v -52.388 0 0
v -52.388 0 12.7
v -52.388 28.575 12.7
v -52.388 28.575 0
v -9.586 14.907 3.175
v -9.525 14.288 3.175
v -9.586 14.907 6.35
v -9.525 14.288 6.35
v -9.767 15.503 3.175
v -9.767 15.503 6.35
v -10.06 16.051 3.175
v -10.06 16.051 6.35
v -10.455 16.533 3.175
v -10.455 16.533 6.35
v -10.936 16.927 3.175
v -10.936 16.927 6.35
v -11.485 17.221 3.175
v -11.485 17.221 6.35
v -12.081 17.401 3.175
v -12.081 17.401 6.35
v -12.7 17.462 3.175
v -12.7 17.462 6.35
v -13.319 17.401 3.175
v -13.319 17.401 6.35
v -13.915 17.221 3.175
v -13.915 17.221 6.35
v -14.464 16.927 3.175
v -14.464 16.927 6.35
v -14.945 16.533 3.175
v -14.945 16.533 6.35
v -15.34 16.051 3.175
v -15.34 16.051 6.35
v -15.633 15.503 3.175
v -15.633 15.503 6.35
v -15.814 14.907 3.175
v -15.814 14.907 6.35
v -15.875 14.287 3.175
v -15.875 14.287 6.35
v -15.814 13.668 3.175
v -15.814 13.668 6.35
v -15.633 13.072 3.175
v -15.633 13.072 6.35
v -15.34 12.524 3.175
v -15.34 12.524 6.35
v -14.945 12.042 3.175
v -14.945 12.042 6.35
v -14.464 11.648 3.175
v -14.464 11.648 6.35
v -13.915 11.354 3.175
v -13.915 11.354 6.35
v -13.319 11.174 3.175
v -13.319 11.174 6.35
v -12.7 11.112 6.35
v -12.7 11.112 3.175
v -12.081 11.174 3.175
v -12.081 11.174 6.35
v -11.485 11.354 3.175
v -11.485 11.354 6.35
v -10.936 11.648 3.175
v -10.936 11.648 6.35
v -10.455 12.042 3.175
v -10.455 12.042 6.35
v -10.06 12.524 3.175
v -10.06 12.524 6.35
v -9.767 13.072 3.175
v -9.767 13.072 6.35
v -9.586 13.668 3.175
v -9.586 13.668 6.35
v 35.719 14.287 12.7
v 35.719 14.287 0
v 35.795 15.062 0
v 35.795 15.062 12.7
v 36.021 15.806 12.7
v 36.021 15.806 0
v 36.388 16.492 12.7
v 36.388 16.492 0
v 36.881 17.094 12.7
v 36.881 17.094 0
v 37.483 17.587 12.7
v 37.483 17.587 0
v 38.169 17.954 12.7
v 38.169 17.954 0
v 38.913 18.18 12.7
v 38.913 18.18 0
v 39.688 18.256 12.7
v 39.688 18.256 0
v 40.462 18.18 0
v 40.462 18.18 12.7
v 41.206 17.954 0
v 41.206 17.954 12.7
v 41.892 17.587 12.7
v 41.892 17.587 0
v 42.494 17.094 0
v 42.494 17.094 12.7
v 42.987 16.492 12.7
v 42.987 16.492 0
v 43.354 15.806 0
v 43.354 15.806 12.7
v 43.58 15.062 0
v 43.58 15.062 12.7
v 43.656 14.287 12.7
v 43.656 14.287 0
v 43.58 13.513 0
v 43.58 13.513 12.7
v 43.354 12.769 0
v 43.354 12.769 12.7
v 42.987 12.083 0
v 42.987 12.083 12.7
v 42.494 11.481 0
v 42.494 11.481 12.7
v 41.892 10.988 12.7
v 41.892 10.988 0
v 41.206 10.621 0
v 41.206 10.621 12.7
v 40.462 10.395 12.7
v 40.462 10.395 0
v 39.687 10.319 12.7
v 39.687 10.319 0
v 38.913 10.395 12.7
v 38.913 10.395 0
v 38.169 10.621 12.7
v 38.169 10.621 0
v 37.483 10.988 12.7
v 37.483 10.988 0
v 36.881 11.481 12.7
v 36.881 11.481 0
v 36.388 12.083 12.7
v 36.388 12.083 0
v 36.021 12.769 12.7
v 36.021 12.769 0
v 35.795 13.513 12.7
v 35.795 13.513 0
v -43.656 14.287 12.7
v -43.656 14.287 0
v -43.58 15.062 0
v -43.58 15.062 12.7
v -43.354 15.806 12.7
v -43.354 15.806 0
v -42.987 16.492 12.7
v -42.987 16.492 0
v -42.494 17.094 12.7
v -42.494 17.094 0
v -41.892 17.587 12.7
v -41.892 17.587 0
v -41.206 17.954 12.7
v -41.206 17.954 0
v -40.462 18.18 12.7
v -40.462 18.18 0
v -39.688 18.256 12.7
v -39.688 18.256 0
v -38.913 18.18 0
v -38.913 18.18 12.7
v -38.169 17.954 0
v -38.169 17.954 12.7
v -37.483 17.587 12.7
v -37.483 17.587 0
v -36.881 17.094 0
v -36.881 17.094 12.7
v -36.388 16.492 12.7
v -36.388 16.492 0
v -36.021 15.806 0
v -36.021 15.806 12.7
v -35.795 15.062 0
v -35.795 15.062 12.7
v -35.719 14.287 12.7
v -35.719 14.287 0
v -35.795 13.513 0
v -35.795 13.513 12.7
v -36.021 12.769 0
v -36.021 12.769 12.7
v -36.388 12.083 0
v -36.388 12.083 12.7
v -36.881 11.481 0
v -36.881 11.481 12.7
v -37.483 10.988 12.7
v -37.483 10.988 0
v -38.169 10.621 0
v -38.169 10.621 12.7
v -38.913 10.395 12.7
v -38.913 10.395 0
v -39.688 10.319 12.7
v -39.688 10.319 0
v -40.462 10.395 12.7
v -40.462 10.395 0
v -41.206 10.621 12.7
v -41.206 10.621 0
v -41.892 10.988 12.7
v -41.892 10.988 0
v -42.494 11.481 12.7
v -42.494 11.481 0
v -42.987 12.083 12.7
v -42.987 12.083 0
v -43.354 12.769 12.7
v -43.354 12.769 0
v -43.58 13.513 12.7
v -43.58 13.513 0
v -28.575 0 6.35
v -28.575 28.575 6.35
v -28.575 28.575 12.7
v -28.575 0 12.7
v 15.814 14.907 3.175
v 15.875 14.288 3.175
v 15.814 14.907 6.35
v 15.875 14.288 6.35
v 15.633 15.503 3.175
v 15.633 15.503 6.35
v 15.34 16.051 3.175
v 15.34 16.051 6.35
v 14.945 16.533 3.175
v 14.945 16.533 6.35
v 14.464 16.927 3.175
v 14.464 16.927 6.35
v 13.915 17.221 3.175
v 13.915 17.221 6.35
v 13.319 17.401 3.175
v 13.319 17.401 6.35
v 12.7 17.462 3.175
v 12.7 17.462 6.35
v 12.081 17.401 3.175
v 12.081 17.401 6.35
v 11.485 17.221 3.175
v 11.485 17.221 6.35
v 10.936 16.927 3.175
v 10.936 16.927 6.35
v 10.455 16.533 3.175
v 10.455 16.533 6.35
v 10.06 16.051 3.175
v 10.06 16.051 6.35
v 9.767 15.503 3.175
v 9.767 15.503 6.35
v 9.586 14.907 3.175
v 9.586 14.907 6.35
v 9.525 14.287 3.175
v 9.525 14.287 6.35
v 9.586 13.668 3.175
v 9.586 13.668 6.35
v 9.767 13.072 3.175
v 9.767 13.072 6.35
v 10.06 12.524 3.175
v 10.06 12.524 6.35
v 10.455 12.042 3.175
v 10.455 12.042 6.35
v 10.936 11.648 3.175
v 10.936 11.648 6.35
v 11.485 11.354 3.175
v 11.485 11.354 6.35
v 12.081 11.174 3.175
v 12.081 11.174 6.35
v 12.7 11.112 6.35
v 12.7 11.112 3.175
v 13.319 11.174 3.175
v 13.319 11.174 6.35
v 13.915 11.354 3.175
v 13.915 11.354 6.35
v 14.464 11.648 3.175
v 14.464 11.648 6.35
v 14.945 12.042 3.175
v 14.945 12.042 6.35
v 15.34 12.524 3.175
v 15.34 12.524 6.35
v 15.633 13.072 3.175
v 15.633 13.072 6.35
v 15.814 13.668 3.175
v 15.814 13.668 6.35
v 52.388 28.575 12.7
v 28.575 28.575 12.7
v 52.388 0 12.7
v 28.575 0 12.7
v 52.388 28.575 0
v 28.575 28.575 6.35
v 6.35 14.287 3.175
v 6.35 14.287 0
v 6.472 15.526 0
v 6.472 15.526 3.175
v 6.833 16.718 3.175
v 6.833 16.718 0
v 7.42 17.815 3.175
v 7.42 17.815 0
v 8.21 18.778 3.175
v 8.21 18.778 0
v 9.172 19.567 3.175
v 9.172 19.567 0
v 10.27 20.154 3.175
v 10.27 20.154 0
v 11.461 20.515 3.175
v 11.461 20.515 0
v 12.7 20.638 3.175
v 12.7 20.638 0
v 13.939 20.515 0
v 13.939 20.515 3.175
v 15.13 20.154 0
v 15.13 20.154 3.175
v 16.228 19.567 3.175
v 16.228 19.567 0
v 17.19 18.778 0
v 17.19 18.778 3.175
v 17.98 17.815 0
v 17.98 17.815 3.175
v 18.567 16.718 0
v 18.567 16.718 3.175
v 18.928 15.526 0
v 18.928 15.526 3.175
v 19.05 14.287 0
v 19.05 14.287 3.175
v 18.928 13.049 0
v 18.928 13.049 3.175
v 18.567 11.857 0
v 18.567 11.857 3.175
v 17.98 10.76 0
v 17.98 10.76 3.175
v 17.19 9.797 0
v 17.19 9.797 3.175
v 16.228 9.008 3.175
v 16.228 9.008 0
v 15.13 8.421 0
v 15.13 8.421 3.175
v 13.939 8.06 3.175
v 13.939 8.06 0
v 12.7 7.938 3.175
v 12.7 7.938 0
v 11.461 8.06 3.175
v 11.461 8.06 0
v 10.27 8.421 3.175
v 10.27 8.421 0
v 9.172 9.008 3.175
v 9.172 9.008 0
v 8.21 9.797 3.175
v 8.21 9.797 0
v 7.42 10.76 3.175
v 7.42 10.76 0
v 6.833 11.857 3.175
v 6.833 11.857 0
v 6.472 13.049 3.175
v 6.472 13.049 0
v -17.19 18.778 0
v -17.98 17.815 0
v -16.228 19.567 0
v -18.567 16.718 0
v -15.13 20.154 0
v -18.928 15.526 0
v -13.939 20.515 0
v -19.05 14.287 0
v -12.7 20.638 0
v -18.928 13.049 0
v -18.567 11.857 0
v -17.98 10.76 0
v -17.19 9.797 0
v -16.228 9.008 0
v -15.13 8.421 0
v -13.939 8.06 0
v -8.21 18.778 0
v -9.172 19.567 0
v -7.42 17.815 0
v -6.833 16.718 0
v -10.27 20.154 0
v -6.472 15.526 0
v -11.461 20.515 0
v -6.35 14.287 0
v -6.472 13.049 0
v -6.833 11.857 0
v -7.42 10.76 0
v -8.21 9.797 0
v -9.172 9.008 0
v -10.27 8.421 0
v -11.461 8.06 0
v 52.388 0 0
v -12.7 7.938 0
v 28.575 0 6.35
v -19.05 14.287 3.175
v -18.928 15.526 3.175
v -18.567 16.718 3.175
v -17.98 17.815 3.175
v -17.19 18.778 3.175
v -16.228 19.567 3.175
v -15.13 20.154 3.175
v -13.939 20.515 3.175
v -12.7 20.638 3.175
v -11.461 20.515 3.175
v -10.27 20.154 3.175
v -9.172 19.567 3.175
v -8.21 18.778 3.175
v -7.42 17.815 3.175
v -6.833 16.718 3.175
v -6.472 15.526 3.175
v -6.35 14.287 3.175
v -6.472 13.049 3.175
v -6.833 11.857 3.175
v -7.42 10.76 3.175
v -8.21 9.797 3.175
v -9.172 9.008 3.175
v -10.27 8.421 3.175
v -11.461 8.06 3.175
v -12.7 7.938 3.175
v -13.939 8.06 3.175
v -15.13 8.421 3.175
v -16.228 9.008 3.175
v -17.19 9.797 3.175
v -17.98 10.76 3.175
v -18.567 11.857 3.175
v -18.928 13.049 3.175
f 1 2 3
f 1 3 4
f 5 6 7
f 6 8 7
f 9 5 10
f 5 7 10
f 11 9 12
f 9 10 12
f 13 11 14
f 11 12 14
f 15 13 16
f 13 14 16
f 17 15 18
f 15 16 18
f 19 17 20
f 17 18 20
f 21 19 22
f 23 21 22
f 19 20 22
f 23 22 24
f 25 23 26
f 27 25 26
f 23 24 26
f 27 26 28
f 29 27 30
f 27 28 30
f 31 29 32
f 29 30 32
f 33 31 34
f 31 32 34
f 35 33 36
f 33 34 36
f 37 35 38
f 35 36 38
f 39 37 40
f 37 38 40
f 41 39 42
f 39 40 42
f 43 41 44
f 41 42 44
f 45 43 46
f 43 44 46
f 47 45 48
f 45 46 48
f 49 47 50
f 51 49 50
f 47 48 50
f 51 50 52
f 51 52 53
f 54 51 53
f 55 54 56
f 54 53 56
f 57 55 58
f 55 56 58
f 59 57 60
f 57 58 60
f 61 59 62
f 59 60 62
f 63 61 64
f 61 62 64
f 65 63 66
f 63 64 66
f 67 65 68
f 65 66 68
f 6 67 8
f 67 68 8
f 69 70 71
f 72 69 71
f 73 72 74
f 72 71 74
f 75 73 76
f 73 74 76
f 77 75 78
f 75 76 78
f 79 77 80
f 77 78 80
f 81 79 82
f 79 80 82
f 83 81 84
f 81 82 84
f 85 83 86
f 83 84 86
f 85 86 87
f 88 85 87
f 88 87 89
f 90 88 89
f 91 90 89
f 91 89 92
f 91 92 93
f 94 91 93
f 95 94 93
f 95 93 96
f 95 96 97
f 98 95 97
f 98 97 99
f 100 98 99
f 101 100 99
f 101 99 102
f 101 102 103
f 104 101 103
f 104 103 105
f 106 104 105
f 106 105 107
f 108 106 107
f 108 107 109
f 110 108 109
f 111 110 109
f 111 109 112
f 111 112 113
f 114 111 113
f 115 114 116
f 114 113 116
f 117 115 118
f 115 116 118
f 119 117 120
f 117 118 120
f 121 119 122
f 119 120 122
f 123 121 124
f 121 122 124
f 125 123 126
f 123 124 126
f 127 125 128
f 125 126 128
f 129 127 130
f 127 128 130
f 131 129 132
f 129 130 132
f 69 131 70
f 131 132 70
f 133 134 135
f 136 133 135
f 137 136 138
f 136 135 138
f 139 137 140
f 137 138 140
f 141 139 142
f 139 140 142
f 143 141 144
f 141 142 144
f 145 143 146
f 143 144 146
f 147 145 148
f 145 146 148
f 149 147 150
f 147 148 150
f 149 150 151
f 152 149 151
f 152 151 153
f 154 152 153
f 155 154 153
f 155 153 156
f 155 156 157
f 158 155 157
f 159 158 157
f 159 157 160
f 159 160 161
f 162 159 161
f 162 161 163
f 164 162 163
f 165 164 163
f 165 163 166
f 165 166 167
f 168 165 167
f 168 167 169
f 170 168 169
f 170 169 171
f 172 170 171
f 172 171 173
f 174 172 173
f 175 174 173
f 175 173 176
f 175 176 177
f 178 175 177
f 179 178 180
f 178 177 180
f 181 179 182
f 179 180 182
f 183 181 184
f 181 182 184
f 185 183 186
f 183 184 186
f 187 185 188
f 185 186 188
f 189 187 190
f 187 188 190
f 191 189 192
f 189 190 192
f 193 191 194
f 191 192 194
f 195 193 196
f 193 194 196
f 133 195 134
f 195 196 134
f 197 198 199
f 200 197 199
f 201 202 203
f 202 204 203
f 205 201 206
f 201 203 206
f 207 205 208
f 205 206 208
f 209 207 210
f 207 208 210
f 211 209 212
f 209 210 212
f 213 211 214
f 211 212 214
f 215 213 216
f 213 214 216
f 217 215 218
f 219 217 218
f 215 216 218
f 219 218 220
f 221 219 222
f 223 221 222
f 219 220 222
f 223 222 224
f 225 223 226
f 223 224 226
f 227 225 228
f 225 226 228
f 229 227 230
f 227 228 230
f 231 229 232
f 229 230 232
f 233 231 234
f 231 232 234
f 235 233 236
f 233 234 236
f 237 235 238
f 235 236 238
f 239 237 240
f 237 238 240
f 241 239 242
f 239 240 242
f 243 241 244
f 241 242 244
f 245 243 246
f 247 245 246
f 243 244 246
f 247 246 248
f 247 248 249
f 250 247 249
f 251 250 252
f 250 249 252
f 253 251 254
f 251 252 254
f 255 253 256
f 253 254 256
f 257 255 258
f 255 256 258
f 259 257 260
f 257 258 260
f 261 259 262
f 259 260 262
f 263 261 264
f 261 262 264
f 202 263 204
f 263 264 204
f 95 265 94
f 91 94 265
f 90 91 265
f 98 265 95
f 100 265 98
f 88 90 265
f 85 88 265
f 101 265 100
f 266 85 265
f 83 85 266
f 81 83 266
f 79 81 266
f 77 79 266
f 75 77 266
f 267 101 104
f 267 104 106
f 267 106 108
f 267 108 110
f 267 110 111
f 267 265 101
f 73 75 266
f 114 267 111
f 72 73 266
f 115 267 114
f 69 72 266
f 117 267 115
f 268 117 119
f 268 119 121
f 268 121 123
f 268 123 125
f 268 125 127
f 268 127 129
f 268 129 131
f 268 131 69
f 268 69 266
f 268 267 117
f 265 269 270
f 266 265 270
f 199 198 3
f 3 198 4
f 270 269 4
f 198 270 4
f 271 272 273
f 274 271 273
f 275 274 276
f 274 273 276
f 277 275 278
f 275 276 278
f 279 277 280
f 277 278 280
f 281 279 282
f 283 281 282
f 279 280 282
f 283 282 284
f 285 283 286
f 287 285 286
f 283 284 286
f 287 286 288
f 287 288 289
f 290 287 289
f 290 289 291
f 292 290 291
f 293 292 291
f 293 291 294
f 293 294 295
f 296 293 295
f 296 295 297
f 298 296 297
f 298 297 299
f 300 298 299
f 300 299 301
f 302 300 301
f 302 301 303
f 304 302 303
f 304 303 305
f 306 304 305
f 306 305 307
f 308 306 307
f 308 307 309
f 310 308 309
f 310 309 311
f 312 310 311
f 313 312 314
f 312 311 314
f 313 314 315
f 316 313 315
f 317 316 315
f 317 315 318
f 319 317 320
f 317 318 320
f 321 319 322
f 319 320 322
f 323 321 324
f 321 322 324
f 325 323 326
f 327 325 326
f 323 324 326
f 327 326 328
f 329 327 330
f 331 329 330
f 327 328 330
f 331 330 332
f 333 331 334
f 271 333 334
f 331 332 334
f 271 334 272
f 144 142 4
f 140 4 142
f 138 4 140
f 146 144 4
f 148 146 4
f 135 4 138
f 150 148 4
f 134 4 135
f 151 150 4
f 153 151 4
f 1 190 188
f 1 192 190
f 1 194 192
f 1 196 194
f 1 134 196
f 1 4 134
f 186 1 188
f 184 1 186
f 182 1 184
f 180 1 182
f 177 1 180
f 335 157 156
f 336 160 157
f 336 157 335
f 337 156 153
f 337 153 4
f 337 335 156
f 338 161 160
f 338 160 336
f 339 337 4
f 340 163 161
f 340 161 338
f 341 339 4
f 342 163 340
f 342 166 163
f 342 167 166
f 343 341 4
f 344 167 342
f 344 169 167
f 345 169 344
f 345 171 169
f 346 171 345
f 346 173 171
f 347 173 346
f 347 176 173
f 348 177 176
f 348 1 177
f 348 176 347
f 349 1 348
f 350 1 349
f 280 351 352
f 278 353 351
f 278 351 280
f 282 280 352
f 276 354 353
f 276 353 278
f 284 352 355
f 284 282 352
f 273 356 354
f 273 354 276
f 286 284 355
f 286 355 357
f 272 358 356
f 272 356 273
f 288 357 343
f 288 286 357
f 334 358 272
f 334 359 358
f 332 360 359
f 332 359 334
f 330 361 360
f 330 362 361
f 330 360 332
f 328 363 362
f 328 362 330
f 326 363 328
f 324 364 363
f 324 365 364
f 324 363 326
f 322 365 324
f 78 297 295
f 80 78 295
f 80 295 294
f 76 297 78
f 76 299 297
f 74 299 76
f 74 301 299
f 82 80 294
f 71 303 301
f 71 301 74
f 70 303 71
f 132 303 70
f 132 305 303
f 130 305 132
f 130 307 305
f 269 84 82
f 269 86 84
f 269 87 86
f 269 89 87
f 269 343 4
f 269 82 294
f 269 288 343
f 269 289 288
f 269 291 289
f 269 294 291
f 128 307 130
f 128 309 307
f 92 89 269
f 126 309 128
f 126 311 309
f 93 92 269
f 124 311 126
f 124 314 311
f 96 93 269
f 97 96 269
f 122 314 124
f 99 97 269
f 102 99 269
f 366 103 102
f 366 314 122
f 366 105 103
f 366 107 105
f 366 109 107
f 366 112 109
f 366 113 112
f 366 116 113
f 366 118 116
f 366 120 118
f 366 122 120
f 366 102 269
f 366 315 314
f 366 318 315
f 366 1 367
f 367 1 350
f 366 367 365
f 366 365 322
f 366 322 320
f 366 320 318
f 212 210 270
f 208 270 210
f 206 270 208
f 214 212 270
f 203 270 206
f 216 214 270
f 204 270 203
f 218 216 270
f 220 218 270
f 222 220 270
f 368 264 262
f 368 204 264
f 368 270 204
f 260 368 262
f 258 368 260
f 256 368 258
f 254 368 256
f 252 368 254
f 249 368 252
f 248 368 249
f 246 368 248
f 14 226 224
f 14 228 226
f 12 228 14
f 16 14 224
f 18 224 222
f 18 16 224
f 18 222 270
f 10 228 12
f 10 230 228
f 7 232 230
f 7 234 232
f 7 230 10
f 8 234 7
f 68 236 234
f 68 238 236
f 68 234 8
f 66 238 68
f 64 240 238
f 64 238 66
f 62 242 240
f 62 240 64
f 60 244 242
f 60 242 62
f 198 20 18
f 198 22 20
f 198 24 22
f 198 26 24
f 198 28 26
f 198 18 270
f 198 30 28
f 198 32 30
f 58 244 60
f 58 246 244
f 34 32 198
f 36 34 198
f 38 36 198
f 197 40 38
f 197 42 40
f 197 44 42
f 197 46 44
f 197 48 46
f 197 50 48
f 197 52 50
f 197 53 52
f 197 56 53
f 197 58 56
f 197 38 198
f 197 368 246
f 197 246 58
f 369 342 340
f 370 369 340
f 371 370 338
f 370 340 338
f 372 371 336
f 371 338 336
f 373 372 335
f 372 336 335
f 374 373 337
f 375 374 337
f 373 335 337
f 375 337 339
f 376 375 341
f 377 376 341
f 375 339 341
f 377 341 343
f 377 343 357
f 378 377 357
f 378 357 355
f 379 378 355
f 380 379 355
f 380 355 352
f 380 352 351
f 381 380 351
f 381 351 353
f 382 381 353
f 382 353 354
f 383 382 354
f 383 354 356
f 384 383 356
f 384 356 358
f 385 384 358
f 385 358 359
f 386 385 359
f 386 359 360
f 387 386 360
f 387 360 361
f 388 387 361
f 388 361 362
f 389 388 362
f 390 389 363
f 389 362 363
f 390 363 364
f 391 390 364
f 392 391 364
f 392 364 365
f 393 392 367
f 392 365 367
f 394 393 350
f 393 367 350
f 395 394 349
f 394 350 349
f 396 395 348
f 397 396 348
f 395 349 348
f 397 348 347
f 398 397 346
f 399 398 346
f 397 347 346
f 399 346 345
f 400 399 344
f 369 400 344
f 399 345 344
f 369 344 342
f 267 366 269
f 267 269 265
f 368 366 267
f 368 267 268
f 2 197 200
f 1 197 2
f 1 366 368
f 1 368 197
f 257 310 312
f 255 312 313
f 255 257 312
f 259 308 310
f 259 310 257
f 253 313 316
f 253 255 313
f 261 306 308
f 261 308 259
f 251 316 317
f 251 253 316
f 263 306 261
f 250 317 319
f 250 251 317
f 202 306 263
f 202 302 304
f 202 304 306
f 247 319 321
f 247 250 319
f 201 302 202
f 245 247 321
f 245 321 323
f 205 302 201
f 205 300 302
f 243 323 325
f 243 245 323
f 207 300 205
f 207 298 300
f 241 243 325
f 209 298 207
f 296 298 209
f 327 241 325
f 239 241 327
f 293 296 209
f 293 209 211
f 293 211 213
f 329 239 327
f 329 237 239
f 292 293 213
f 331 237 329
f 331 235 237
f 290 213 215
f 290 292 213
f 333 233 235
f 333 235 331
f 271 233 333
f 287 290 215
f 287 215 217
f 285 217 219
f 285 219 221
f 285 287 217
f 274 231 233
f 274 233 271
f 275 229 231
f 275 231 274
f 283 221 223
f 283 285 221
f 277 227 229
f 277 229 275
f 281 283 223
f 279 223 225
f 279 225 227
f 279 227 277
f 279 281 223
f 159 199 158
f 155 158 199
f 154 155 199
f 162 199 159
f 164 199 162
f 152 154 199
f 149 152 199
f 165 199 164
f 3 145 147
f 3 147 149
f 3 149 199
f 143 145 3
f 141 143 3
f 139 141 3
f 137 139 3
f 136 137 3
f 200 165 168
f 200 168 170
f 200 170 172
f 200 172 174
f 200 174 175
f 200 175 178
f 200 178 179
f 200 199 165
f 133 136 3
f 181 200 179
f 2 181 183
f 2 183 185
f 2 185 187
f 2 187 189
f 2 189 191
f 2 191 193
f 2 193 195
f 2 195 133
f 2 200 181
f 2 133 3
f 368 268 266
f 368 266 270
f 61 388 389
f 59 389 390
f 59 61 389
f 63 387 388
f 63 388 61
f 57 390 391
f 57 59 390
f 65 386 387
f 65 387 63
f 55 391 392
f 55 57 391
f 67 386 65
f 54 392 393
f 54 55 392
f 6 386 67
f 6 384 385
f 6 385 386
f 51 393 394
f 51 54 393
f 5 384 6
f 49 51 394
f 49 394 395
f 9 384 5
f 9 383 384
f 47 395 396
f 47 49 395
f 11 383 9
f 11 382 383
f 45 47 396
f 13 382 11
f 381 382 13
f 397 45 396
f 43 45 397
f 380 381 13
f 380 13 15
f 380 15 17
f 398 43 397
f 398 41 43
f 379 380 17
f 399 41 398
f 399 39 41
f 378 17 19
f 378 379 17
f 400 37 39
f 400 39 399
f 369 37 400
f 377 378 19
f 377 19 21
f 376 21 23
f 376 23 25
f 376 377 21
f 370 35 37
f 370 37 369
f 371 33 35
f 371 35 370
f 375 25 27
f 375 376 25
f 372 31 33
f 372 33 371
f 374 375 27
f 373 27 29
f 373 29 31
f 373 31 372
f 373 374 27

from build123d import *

# Parameters (mm, degrees)
BOSS_EXTRUDE1_DEPTH            = 28.575
HOLE1_D                        = 6.35
HOLE1_DEPTH                    = 12.7
HOLE1_CBORE_D                  = 12.7
HOLE1_CBORE_DEPTH              = 3.175
HOLE1_TIP                      = 1.907732465
F_5_16_0_3125_DIAMETER_HOLE1_D = 7.9375


with BuildPart() as part:
    # Sketch1 → Boss-Extrude1 (new body)
    with BuildSketch(Plane(origin=(0, 0, 0), x_dir=(1, 0, 0), z_dir=(0, 1, 0))):
        Polygon((-52.3875, 0), (52.3875, 0), (52.3875, -12.7), (28.575, -12.7), (28.575, -6.35), (-28.575, -6.35), (-28.575, -12.7), (-52.3875, -12.7), align=None)
    extrude(amount=BOSS_EXTRUDE1_DEPTH)

    # Hole1
    with Locations(Plane(origin=(0, 0, 0), x_dir=(-1, 0, 0), z_dir=(0, 0, -1))):
        with Locations((-12.7, 14.2875), (12.7, 14.2875)):
            CounterBoreHole(HOLE1_D / 2, HOLE1_CBORE_D / 2, HOLE1_CBORE_DEPTH, depth=HOLE1_DEPTH)
            with Locations((0, 0, -(HOLE1_DEPTH + HOLE1_TIP / 2))):  # 118° drill point
                Cone(0, HOLE1_D / 2, HOLE1_TIP, mode=Mode.SUBTRACT)

    # 5/16 (0.3125) Diameter Hole1 (through all)
    with Locations(Plane.XY.offset(12.7)):
        with Locations((-39.6875, 14.2875), (39.6875, 14.2875)):
            Hole(F_5_16_0_3125_DIAMETER_HOLE1_D / 2)


solid = part.part
